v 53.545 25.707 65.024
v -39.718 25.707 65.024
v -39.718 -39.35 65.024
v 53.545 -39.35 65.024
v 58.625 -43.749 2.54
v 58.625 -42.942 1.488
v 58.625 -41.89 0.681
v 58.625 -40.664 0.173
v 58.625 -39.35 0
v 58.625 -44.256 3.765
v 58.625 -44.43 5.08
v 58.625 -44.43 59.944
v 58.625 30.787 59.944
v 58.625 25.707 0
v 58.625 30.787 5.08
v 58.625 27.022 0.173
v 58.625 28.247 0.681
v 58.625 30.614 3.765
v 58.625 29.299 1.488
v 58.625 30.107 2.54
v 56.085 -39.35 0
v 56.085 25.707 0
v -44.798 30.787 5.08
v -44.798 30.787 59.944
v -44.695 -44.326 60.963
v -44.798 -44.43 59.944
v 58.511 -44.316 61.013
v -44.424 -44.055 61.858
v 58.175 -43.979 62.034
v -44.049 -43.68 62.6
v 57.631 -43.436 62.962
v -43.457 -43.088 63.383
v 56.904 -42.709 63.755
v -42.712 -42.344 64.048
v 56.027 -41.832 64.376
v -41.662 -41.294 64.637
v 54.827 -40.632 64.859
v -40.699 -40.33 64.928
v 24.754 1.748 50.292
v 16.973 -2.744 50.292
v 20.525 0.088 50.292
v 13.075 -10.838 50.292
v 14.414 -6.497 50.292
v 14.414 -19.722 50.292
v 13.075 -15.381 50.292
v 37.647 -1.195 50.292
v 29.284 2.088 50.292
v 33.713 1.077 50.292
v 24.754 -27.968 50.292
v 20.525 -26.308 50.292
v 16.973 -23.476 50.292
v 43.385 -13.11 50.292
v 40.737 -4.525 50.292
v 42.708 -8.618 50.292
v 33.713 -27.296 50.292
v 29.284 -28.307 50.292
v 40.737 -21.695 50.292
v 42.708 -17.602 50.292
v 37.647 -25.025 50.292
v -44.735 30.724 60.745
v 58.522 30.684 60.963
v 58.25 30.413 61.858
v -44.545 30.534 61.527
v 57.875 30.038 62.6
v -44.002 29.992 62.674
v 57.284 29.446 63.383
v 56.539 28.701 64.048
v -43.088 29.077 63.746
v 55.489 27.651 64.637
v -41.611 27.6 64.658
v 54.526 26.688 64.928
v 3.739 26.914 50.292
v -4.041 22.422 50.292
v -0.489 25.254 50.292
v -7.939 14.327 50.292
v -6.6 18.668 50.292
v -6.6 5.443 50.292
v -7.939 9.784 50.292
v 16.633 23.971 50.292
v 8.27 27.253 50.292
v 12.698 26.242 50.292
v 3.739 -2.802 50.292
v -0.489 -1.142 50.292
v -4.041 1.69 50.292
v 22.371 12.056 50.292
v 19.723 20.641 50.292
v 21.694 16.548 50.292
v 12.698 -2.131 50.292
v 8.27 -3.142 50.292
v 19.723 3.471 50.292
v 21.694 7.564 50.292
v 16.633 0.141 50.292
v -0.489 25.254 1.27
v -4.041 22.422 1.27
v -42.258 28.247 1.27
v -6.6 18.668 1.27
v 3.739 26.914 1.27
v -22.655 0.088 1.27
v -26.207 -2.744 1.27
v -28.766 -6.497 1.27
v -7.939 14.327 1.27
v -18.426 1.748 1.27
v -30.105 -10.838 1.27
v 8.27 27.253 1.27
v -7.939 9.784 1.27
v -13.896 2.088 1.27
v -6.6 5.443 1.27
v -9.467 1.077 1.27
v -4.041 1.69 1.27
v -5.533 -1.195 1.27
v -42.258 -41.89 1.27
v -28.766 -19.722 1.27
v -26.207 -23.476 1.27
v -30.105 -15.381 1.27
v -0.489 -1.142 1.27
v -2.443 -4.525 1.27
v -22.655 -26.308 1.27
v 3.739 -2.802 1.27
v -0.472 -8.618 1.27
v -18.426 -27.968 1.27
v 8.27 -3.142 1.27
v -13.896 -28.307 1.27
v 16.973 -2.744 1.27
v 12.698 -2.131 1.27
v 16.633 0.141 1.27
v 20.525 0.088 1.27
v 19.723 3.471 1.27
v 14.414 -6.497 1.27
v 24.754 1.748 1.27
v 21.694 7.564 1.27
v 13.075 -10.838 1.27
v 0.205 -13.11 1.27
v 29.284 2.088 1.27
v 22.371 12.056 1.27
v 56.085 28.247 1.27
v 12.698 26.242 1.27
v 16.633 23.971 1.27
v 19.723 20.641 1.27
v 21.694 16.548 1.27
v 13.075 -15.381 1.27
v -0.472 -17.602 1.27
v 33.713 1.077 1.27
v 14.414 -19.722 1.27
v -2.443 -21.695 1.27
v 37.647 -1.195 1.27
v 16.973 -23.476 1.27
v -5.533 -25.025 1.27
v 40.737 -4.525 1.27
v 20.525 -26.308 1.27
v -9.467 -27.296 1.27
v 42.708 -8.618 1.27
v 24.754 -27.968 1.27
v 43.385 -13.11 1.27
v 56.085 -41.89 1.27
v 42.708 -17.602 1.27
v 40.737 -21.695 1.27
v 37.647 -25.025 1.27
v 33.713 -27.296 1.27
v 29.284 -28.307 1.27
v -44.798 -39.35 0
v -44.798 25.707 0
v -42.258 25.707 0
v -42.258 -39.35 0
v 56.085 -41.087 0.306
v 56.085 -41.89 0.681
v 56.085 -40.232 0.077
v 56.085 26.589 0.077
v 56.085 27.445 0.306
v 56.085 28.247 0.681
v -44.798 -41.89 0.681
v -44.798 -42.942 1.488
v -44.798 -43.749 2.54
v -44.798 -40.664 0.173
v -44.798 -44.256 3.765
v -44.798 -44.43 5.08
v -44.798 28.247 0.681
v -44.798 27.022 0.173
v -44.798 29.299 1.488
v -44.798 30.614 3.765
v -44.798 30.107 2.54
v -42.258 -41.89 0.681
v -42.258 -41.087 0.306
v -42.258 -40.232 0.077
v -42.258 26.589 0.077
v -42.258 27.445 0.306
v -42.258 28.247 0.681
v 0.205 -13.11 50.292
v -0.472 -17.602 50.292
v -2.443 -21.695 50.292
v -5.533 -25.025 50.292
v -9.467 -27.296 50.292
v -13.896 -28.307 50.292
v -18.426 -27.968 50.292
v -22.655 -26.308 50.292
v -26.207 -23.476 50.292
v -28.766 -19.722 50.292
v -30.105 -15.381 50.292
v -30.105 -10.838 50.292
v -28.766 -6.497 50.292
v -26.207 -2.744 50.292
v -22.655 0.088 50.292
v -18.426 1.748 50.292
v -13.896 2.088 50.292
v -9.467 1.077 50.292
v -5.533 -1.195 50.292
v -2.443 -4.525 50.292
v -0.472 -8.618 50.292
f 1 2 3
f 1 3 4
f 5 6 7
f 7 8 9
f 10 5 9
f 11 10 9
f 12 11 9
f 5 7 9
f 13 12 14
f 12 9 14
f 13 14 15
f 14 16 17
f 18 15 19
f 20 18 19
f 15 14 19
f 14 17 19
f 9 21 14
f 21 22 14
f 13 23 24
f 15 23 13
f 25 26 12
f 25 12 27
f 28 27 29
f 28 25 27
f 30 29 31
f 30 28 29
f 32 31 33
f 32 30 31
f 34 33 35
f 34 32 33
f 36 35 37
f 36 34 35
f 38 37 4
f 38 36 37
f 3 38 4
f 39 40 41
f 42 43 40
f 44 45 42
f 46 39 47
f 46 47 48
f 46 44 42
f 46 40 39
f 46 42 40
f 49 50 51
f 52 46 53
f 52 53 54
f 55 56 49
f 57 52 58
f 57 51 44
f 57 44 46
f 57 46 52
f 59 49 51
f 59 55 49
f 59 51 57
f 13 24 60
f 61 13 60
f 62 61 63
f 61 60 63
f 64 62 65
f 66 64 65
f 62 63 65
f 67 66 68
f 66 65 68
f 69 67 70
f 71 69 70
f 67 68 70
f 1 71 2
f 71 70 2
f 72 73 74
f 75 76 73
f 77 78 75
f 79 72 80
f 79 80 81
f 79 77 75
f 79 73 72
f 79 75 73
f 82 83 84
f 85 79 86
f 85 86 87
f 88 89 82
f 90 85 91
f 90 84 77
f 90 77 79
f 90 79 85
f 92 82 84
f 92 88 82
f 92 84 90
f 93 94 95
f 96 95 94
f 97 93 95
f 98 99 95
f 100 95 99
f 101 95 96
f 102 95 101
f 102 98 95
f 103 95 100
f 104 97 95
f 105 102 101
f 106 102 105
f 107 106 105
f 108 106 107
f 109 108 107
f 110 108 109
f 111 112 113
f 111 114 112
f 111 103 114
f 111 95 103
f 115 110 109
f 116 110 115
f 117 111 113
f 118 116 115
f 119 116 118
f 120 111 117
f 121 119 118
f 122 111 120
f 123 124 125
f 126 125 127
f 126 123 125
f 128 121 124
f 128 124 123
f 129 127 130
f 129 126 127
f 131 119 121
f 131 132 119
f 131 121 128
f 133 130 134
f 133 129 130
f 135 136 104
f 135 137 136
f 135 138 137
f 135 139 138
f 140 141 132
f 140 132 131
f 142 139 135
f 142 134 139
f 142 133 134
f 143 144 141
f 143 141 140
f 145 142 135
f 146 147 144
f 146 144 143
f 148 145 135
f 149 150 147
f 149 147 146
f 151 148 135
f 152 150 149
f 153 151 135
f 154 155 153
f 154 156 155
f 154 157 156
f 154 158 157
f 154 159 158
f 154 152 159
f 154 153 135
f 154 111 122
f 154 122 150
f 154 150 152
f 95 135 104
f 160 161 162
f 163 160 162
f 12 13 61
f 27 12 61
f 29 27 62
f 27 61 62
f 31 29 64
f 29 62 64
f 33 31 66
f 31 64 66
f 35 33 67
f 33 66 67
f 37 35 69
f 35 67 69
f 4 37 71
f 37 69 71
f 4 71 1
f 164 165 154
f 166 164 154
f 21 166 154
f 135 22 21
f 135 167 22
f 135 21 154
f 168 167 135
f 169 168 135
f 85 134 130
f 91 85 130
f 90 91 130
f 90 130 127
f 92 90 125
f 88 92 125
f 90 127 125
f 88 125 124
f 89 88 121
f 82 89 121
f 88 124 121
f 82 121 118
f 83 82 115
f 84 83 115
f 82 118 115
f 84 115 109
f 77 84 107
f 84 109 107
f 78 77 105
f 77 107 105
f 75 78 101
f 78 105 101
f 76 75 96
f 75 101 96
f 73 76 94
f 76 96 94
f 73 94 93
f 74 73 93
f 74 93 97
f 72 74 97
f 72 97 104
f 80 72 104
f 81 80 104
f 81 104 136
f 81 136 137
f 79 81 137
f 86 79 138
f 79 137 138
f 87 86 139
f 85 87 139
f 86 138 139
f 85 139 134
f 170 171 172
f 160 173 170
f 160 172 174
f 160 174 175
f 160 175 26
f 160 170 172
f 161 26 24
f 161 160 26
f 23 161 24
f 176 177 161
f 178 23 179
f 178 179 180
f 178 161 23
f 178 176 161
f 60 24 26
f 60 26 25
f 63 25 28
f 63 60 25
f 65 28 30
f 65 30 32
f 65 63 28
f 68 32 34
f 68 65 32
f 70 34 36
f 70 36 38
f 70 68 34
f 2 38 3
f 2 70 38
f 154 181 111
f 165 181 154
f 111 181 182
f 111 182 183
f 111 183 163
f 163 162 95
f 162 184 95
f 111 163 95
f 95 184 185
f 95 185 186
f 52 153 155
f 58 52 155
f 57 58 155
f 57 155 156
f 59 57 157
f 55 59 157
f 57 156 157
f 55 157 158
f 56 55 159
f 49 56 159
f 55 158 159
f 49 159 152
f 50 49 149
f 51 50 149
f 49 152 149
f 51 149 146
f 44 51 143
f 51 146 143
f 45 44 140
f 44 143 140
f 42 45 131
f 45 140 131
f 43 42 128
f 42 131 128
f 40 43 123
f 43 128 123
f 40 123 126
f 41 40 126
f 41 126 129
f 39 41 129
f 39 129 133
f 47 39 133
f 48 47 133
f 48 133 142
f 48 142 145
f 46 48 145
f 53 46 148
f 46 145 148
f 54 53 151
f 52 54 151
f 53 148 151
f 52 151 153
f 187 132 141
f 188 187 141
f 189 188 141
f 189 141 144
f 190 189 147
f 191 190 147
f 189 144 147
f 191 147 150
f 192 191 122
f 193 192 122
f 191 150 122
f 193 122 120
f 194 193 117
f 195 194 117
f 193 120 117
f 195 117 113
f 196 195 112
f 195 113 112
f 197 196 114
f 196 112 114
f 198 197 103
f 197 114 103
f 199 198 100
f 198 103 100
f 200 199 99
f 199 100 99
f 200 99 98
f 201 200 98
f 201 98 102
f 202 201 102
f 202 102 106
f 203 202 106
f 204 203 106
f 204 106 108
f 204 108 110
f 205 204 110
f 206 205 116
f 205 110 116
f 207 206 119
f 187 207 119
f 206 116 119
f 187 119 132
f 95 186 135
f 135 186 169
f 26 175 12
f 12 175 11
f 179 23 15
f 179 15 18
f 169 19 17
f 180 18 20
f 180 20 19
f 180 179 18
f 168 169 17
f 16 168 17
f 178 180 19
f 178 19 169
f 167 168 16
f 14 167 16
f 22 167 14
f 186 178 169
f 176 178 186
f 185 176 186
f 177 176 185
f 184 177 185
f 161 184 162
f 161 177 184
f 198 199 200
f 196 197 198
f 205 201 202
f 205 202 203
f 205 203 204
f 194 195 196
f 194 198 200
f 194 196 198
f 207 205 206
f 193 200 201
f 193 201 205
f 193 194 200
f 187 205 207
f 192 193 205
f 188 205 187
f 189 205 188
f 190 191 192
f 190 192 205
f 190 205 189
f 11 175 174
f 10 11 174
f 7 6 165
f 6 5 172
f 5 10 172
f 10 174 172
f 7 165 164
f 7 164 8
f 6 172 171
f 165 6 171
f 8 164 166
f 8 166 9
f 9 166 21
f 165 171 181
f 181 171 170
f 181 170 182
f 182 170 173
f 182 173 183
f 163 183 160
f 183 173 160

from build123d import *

# Parameters (mm, degrees)
F0_W        = 103.4230701625
F0_H        = 75.2167738974
F1_DEPTH    = 65.024
F2_T        = -2.54
F3_T1_DEPTH = 128.8230701625
F3_T3_DEPTH = 100.6167738974
F4_W        = 31.4045592836
F4_H        = 70.1367738974
F5_DEPTH    = 61.214
F6_R        = 15.24
F7_DEPTH    = 49.022


# Not quite as in the source:
# - a fillet or chamfer that OpenCascade refuses, or shapes differently, is made with other operations: its cross-section is extruded or revolved along the edge and cut away or added


with BuildPart() as f1:
    # F0 (on Top) → F1 (new body)
    with BuildSketch(Plane.XY):
        with Locations((6.9133061916, -6.8211276084)):
            Rectangle(F0_W, F0_H)
    extrude(amount=F1_DEPTH)

    # F2
    f2_openings = [f1.faces().sort_by_distance(p)[0] for p in [
        (6.913306, -6.821128, 0),
    ]]
    offset(amount=F2_T, openings=f2_openings)

    # F3: fillet of radius 5.08 on 6 edges, made by hand

    # F3_s2 → F3_t1 (cut)
    with BuildSketch(Plane.YZ.offset(-57.4982288897)):
        with BuildLine():
            ThreePointArc((-44.4295145571, 59.944), (-42.9416170056, 63.5361024484), (-39.3495145571, 65.024))
            Line((-39.3495145571, 65.024), (-44.4295145571, 65.024))
            Line((-44.4295145571, 65.024), (-44.4295145571, 59.944))
        make_face()
        with BuildLine():
            ThreePointArc((30.7872593403, 59.944), (29.2993617887, 63.5361024484), (25.7072593403, 65.024))
            Line((25.7072593403, 65.024), (30.7872593403, 65.024))
            Line((30.7872593403, 65.024), (30.7872593403, 59.944))
        make_face()
        with BuildLine():
            ThreePointArc((30.7872593403, 5.08), (29.2993617887, 1.4878975516), (25.7072593403, 0))
            Line((25.7072593403, 0), (30.7872593403, 0))
            Line((30.7872593403, 0), (30.7872593403, 5.08))
        make_face()
        with BuildLine():
            ThreePointArc((-44.4295145571, 5.08), (-42.9416170056, 1.4878975516), (-39.3495145571, 0))
            Line((-39.3495145571, 0), (-44.4295145571, 0))
            Line((-44.4295145571, 0), (-44.4295145571, 5.08))
        make_face()
    extrude(amount=F3_T1_DEPTH, mode=Mode.SUBTRACT)

    # F3_s4 → F3_t3 (cut)
    with BuildSketch(Plane.XZ.offset(-43.4872593403)):
        with BuildLine():
            ThreePointArc((-44.7982288897, 59.944), (-43.3103313381, 63.5361024484), (-39.7182288897, 65.024))
            Line((-39.7182288897, 65.024), (-44.7982288897, 65.024))
            Line((-44.7982288897, 65.024), (-44.7982288897, 59.944))
        make_face()
        with BuildLine():
            ThreePointArc((58.6248412728, 59.944), (57.1369437213, 63.5361024484), (53.5448412728, 65.024))
            Line((53.5448412728, 65.024), (58.6248412728, 65.024))
            Line((58.6248412728, 65.024), (58.6248412728, 59.944))
        make_face()
    extrude(amount=F3_T3_DEPTH, mode=Mode.SUBTRACT)

    # F4 (on face) → F5 (join)
    with BuildSketch(Plane(origin=(0, 0, 62.484), x_dir=(1, 0, 0), z_dir=(0, 0, -1))):
        Polygon((24.3728496134, 41.8895145571), (-10.8536696061, 41.8895145571), (-10.8536696061, -28.2472593403), (56.0848412728, -28.2472593403), (56.0848412728, 41.8895145571), align=None)
        with Locations((-26.5559492479, 6.8211276084)):
            Rectangle(F4_W, F4_H)
    extrude(amount=F5_DEPTH)

    # F6 (on face) → F7 (cut)
    with BuildSketch(Plane(origin=(0, 0, 1.27), x_dir=(1, 0, 0), z_dir=(0, 0, -1))):
        with Locations((-15.0351587272, 13.1098517179)):
            Circle(F6_R)
        with Locations((28.1448412728, 13.1098517179)):
            Circle(F6_R)
        with Locations((7.1306948804, -12.0557340983)):
            Circle(F6_R)
    extrude(amount=-F7_DEPTH, mode=Mode.SUBTRACT)


solid = f1.part
